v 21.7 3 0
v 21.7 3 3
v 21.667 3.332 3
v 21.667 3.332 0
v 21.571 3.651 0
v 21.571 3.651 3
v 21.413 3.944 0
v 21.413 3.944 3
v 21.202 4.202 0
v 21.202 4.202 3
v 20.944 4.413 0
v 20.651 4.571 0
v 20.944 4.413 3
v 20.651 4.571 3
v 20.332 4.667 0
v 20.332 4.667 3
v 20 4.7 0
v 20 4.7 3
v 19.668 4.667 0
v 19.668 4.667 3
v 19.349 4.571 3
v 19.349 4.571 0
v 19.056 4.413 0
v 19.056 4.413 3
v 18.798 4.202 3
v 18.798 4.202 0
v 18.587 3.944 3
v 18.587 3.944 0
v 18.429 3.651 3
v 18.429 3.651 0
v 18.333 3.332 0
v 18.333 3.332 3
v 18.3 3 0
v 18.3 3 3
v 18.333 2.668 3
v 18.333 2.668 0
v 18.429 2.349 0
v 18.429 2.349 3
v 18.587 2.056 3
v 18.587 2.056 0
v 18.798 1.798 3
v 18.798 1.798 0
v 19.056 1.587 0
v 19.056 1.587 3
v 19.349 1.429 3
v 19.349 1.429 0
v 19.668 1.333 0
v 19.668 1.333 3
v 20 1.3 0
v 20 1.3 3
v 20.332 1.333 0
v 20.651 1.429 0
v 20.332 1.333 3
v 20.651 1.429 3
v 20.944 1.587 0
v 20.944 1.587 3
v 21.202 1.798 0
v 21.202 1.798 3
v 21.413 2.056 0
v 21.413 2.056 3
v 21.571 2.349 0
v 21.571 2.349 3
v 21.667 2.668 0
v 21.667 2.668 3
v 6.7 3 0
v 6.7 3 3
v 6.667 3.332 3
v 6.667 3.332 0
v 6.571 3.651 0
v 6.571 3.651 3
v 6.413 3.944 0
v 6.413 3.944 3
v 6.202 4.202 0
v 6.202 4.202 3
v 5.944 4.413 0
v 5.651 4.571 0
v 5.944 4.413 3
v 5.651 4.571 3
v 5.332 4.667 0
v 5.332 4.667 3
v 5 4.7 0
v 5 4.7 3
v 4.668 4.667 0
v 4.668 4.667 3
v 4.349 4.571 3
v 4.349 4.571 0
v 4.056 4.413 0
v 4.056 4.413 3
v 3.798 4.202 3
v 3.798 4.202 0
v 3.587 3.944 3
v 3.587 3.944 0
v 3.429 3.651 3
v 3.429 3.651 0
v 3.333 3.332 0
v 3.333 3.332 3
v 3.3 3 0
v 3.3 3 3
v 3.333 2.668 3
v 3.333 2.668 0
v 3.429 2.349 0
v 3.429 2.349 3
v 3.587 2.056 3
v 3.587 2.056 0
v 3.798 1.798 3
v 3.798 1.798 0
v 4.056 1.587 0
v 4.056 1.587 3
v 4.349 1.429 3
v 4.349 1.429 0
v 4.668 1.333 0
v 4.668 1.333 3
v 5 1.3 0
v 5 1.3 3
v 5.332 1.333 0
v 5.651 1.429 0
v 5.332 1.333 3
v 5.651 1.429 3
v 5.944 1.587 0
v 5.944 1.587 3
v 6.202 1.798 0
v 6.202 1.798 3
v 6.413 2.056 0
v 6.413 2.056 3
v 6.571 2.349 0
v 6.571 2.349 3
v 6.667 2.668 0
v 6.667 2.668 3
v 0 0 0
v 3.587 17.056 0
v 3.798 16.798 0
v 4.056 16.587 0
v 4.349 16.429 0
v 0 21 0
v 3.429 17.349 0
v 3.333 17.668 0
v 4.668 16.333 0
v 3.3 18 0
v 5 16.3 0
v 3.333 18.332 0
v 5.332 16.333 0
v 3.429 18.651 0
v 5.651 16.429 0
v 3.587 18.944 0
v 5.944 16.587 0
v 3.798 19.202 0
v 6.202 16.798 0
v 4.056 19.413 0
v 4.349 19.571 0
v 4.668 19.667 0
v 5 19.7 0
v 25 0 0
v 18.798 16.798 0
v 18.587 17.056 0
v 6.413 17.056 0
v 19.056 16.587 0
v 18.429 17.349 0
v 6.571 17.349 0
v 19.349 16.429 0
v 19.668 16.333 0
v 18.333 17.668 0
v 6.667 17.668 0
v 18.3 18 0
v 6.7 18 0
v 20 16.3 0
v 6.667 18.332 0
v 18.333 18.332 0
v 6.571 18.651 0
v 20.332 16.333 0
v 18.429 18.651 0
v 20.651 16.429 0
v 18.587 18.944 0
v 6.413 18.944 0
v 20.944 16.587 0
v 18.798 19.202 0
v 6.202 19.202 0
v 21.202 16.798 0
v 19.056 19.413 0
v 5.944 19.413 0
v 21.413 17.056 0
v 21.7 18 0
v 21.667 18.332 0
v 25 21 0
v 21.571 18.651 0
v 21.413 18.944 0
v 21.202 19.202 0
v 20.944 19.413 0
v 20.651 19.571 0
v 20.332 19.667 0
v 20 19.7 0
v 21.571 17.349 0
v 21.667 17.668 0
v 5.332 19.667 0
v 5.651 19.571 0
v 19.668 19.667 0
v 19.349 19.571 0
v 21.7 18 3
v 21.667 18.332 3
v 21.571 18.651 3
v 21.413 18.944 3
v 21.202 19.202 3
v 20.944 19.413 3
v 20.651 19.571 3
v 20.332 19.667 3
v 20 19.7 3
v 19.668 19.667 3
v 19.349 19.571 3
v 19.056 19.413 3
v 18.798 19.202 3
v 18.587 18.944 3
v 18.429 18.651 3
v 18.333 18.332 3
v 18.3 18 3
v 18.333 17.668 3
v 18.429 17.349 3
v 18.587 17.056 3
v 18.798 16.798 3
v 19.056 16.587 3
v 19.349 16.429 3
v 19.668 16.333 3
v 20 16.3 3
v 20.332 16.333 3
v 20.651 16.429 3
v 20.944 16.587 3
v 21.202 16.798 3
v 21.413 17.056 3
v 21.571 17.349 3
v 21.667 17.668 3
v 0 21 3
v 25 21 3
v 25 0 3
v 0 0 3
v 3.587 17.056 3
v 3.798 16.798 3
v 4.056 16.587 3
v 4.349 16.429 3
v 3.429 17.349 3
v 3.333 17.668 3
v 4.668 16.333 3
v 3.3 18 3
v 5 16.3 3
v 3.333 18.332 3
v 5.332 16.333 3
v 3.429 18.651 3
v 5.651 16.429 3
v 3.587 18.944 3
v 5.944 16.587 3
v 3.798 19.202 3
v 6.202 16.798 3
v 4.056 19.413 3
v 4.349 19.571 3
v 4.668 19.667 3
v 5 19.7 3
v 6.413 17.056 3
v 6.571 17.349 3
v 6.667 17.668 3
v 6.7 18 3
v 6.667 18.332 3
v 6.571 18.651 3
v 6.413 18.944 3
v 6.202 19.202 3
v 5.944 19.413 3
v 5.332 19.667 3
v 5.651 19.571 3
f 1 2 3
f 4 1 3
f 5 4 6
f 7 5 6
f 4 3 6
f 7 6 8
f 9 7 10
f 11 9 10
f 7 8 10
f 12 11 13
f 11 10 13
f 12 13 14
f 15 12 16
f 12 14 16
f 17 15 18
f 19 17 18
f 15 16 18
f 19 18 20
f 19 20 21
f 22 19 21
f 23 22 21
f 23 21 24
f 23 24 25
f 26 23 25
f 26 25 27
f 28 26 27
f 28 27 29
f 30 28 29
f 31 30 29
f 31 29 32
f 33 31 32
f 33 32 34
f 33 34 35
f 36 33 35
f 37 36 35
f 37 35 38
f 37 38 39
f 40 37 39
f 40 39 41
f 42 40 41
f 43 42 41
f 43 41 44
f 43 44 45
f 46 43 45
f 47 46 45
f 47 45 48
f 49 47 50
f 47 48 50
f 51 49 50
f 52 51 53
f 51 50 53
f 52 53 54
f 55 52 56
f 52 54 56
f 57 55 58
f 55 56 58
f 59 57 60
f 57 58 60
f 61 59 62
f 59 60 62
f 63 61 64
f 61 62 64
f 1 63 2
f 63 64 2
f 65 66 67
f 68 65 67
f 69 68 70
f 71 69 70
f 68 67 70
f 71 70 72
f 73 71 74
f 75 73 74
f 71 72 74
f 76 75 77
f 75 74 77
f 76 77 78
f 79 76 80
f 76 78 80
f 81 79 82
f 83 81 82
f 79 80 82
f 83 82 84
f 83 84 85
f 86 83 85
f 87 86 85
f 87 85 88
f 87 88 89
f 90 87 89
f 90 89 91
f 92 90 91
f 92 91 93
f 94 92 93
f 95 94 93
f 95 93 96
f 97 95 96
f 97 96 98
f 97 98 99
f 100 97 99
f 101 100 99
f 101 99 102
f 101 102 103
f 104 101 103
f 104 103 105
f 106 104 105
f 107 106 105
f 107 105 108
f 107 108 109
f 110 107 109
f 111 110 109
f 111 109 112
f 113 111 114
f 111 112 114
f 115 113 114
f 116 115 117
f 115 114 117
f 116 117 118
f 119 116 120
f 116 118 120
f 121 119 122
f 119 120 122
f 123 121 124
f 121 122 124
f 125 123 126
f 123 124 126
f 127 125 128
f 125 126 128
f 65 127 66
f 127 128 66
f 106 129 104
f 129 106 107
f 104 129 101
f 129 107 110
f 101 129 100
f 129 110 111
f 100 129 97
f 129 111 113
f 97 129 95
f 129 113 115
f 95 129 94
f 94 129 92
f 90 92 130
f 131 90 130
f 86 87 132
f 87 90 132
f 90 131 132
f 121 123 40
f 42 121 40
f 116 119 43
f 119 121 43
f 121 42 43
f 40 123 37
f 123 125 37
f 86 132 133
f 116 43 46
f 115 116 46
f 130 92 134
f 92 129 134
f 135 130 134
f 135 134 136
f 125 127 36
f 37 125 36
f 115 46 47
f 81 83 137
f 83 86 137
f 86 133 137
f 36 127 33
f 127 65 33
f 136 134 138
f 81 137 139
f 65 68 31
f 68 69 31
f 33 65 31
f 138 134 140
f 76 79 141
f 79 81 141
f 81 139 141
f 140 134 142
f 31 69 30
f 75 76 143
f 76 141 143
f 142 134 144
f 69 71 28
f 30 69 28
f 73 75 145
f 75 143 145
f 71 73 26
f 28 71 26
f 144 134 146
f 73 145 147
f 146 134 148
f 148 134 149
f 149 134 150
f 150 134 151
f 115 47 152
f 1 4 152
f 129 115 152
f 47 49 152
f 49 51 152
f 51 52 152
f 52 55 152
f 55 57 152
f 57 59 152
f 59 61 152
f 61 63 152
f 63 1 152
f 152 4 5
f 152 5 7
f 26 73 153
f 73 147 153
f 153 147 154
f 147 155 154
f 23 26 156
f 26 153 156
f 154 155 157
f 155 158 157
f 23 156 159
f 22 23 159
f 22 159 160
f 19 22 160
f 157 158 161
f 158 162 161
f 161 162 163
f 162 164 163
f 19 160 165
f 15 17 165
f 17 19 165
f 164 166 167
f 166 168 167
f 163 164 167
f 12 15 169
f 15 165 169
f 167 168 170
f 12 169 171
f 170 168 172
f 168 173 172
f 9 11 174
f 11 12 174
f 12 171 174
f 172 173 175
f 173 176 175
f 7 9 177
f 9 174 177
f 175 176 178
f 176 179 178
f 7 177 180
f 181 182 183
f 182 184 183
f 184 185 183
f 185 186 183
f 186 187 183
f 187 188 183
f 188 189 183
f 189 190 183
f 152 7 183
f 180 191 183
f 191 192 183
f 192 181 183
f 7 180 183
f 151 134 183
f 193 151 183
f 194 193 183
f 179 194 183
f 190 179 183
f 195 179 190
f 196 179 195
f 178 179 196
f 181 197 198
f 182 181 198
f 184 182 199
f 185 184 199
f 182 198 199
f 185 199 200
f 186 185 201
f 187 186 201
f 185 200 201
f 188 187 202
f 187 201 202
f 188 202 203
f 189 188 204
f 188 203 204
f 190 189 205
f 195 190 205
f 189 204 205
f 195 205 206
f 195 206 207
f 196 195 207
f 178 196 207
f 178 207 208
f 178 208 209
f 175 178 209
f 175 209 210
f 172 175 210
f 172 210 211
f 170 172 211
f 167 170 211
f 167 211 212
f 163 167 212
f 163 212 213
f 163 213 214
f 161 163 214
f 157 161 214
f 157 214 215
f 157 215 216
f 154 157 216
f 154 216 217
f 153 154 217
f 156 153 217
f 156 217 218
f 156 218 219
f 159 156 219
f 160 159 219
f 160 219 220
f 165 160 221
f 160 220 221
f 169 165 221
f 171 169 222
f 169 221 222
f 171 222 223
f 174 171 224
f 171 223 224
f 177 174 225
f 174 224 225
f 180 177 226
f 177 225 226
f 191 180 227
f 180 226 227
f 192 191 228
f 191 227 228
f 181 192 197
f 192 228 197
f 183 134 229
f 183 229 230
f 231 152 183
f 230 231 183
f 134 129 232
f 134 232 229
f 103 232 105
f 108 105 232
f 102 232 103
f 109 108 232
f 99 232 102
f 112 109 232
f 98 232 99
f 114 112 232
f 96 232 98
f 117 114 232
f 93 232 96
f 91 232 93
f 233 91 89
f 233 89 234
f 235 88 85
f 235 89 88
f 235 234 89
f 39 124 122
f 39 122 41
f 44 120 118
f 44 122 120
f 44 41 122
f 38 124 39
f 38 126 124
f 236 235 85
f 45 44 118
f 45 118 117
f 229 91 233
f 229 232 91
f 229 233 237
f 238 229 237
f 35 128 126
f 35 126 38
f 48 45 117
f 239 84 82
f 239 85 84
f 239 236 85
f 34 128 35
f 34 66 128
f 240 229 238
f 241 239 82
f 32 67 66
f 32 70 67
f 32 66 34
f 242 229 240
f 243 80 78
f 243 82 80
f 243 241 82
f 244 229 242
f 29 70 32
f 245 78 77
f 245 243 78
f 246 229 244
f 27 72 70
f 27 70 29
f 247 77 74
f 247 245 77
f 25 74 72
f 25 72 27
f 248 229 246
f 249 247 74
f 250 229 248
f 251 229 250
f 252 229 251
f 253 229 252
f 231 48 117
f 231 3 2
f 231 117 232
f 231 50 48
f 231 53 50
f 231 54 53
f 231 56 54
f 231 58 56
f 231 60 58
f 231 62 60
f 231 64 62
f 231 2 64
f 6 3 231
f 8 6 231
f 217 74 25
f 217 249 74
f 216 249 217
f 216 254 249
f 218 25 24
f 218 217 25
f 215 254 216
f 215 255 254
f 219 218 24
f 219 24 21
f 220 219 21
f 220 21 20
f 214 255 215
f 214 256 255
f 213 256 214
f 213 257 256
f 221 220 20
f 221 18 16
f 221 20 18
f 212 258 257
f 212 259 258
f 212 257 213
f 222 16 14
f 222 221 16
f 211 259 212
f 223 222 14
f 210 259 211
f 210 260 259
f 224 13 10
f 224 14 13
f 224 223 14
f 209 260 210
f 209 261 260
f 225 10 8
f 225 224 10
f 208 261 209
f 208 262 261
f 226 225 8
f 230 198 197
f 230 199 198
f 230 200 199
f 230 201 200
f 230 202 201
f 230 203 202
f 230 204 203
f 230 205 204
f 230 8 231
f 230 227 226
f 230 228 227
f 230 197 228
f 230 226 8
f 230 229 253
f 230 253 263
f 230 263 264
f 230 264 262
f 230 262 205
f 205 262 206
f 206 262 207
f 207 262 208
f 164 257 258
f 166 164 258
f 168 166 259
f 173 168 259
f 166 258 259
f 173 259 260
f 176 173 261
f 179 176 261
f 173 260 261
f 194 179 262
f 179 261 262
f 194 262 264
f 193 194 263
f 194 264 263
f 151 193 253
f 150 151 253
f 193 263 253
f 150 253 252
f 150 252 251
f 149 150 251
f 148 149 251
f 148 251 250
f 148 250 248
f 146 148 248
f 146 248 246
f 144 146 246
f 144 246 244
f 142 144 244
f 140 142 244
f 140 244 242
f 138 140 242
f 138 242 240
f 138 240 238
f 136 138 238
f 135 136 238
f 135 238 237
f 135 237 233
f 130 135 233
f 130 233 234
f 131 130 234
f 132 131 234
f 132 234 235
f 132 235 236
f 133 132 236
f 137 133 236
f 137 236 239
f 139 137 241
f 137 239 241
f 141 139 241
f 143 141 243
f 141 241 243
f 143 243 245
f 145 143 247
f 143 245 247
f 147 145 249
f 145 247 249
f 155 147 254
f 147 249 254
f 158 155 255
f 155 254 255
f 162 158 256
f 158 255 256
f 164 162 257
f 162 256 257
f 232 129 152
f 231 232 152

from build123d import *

# Parameters (mm, degrees)
SKETCH_1_W          = 25
SKETCH_1_H          = 21
EXTRUDE_1_DEPTH     = 3
CUT_EXTRUDE_1_REACH = 34.787
SKETCH_2_R          = 1.7


with BuildPart() as part:
    # 草图1 → 凸台-拉伸1 (new body)
    with BuildSketch(Plane.XY):
        with Locations((12.5, 10.5)):
            Rectangle(SKETCH_1_W, SKETCH_1_H)
    extrude(amount=EXTRUDE_1_DEPTH)

    # 草图2 → 切除-拉伸1 (cut, up to next)
    with BuildSketch(Plane.XY.offset(3), mode=Mode.PRIVATE) as cut_extrude_1_sk1:
        with Locations((20, 18)):
            Circle(SKETCH_2_R)
    cut_extrude_1_tool1 = extrude(cut_extrude_1_sk1.sketch, amount=-CUT_EXTRUDE_1_REACH, mode=Mode.PRIVATE) & part.part
    # 草图2 → 切除-拉伸1 (cut, up to next)
    with BuildSketch(Plane.XY.offset(3), mode=Mode.PRIVATE) as cut_extrude_1_sk2:
        with Locations((5, 18)):
            Circle(SKETCH_2_R)
    cut_extrude_1_tool2 = extrude(cut_extrude_1_sk2.sketch, amount=-CUT_EXTRUDE_1_REACH, mode=Mode.PRIVATE) & part.part
    # 草图2 → 切除-拉伸1 (cut, up to next)
    with BuildSketch(Plane.XY.offset(3), mode=Mode.PRIVATE) as cut_extrude_1_sk3:
        with Locations((5, 3)):
            Circle(SKETCH_2_R)
    cut_extrude_1_tool3 = extrude(cut_extrude_1_sk3.sketch, amount=-CUT_EXTRUDE_1_REACH, mode=Mode.PRIVATE) & part.part
    # 草图2 → 切除-拉伸1 (cut, up to next)
    with BuildSketch(Plane.XY.offset(3), mode=Mode.PRIVATE) as cut_extrude_1_sk4:
        with Locations((20, 3)):
            Circle(SKETCH_2_R)
    cut_extrude_1_tool4 = extrude(cut_extrude_1_sk4.sketch, amount=-CUT_EXTRUDE_1_REACH, mode=Mode.PRIVATE) & part.part
    add(cut_extrude_1_tool1.solids().sort_by_distance((20, 18, 3))[0], mode=Mode.SUBTRACT)
    add(cut_extrude_1_tool2.solids().sort_by_distance((5, 18, 3))[0], mode=Mode.SUBTRACT)
    add(cut_extrude_1_tool3.solids().sort_by_distance((5, 3, 3))[0], mode=Mode.SUBTRACT)
    add(cut_extrude_1_tool4.solids().sort_by_distance((20, 3, 3))[0], mode=Mode.SUBTRACT)


solid = part.part
